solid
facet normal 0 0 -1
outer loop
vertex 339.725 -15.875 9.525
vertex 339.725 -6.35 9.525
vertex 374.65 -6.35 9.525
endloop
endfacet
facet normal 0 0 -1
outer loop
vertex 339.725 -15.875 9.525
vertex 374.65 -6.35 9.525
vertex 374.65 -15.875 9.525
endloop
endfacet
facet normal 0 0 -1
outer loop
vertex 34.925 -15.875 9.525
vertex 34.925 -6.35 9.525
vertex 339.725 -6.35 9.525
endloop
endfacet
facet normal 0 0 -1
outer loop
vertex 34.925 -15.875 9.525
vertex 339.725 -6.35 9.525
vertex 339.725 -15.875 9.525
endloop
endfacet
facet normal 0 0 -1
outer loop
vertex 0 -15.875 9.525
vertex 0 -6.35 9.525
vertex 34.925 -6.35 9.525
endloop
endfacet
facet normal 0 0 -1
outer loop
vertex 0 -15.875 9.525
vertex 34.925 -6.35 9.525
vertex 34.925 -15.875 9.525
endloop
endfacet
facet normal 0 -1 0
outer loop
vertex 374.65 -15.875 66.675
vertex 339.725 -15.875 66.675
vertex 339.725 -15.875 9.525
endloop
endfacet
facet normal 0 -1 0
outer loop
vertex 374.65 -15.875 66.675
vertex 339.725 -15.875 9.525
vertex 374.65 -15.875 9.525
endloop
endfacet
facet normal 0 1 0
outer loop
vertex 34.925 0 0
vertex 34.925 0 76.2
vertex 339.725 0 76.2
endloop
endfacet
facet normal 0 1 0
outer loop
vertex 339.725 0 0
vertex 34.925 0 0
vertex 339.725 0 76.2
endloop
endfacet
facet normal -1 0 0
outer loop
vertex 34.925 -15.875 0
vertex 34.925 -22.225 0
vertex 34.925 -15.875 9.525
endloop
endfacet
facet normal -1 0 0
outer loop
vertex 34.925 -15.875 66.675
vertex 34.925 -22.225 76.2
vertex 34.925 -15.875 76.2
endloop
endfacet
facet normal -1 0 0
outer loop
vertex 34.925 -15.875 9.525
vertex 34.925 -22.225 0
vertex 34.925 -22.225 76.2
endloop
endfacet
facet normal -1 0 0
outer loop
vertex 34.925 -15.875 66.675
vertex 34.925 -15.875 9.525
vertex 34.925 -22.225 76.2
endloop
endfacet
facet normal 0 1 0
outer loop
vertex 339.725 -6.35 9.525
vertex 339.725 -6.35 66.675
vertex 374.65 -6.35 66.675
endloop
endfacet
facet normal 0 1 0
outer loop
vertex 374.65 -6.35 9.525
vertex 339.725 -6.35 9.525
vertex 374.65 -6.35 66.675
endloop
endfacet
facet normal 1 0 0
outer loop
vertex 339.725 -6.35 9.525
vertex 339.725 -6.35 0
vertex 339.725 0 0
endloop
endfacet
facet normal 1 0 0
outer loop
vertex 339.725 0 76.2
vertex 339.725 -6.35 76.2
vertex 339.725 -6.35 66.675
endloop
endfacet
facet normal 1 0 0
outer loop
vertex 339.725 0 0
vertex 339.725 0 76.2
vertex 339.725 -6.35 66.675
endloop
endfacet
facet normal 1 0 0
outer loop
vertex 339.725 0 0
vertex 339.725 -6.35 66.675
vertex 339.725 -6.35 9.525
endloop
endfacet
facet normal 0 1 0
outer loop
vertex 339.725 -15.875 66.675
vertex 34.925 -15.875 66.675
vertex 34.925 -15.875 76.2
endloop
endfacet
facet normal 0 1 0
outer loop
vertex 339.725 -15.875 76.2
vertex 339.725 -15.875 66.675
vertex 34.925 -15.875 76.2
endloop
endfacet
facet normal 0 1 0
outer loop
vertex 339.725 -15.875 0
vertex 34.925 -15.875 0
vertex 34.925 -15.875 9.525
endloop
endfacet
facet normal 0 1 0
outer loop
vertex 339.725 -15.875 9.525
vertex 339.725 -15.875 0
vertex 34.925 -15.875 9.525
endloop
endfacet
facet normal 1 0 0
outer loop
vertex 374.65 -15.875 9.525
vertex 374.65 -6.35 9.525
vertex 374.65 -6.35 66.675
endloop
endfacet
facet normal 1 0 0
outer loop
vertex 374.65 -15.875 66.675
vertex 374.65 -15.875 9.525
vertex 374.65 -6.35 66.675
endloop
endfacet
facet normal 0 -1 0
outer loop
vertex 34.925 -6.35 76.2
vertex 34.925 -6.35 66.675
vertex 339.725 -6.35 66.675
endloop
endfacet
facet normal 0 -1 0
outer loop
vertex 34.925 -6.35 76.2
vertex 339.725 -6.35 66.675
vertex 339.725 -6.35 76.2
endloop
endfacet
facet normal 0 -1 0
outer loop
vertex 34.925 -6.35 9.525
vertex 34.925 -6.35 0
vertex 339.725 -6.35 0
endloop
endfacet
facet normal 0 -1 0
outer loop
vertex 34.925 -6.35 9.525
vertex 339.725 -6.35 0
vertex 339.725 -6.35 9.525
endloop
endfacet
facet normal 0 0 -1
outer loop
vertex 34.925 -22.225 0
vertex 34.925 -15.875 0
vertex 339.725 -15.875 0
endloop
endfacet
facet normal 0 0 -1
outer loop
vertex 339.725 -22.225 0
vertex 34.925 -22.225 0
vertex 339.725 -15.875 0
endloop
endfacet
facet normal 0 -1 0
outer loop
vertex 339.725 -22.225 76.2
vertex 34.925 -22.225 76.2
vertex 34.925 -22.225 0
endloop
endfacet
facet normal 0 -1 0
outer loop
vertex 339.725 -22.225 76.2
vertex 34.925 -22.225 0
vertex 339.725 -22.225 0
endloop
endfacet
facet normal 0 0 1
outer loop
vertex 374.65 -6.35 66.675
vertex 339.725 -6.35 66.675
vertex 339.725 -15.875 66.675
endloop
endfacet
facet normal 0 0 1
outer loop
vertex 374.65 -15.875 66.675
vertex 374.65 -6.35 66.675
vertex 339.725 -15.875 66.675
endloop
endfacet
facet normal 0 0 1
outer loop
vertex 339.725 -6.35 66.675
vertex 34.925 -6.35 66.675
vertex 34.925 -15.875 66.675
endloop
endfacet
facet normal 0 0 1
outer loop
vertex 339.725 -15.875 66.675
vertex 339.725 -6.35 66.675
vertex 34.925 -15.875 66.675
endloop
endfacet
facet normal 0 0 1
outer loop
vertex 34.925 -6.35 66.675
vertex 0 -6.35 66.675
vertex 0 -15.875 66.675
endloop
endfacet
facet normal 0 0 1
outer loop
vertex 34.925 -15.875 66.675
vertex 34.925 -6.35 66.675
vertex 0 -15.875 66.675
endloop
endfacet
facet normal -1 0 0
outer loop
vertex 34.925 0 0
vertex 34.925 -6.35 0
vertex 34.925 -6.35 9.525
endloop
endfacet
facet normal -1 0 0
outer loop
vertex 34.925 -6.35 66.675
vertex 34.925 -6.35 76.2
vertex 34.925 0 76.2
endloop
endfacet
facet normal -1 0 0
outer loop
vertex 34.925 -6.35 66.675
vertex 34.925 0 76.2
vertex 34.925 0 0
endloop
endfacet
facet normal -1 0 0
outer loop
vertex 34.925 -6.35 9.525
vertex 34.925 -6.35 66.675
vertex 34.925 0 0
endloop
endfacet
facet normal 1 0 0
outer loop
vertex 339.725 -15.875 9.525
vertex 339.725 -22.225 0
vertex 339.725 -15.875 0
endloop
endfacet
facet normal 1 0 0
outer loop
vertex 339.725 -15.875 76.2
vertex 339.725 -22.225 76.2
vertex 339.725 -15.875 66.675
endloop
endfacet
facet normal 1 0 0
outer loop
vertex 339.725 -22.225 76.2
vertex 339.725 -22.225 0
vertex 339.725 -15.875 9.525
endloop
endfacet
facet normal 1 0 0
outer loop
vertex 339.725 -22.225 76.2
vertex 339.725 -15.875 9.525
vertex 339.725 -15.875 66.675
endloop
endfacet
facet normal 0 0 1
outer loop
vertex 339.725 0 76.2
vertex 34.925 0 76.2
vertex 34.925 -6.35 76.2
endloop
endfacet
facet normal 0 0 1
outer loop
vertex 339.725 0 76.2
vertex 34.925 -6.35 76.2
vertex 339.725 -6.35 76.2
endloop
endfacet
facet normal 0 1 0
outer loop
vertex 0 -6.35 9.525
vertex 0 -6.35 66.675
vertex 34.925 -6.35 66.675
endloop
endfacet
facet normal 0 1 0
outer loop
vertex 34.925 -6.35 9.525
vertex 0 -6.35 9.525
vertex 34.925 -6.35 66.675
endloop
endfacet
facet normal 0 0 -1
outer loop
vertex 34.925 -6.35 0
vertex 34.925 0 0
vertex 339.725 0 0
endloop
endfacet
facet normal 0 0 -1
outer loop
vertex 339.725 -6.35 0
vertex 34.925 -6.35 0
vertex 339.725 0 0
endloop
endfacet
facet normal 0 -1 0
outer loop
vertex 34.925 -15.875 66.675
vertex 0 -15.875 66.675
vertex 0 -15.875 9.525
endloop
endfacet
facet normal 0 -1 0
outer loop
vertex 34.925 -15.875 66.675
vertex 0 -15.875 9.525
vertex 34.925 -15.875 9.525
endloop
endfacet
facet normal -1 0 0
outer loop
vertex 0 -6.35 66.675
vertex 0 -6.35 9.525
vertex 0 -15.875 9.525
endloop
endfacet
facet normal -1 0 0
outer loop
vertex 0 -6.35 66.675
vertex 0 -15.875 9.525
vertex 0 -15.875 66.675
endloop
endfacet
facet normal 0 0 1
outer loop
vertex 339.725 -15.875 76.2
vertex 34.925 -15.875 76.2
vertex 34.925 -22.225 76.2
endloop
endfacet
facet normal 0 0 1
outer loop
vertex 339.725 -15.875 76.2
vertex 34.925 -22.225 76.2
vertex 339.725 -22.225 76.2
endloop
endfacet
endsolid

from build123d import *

# Parameters (mm, degrees)
F0_W     = 374.65
F0_H     = 76.2
F1_DEPTH = 22.225
F2_W     = 34.925
F2_H     = 6.35
F3_DEPTH = 76.2
F4_W     = 9.525
F4_H     = 9.525
F5_DEPTH = 374.65


with BuildPart() as f1:
    # F0 (on Front) → F1 (new body)
    with BuildSketch(Plane.XZ):
        with Locations((187.325, 38.1)):
            Rectangle(F0_W, F0_H)
    extrude(amount=F1_DEPTH)

    # F2 (on face) → F3 (cut, through all)
    with BuildSketch(Plane.XY.offset(76.2)):
        with Locations((17.4625, -3.175)):
            Rectangle(F2_W, F2_H)
        with Locations((17.4625, -19.05)):
            Rectangle(F2_W, F2_H)
        with Locations((357.1875, -3.175)):
            Rectangle(F2_W, F2_H)
        with Locations((357.1875, -19.05)):
            Rectangle(F2_W, F2_H)
    extrude(amount=-F3_DEPTH, mode=Mode.SUBTRACT)

    # F4 (on face) → F5 (cut, through all)
    with BuildSketch(Plane(origin=(0, 0, 0), x_dir=(0, -1, 0), z_dir=(-1, 0, 0))):
        with Locations((11.1125, 71.4375)):
            Rectangle(F4_W, F4_H)
        with Locations((11.1125, 4.7625)):
            Rectangle(F4_W, F4_H)
    extrude(amount=-F5_DEPTH, mode=Mode.SUBTRACT)


solid = f1.part
